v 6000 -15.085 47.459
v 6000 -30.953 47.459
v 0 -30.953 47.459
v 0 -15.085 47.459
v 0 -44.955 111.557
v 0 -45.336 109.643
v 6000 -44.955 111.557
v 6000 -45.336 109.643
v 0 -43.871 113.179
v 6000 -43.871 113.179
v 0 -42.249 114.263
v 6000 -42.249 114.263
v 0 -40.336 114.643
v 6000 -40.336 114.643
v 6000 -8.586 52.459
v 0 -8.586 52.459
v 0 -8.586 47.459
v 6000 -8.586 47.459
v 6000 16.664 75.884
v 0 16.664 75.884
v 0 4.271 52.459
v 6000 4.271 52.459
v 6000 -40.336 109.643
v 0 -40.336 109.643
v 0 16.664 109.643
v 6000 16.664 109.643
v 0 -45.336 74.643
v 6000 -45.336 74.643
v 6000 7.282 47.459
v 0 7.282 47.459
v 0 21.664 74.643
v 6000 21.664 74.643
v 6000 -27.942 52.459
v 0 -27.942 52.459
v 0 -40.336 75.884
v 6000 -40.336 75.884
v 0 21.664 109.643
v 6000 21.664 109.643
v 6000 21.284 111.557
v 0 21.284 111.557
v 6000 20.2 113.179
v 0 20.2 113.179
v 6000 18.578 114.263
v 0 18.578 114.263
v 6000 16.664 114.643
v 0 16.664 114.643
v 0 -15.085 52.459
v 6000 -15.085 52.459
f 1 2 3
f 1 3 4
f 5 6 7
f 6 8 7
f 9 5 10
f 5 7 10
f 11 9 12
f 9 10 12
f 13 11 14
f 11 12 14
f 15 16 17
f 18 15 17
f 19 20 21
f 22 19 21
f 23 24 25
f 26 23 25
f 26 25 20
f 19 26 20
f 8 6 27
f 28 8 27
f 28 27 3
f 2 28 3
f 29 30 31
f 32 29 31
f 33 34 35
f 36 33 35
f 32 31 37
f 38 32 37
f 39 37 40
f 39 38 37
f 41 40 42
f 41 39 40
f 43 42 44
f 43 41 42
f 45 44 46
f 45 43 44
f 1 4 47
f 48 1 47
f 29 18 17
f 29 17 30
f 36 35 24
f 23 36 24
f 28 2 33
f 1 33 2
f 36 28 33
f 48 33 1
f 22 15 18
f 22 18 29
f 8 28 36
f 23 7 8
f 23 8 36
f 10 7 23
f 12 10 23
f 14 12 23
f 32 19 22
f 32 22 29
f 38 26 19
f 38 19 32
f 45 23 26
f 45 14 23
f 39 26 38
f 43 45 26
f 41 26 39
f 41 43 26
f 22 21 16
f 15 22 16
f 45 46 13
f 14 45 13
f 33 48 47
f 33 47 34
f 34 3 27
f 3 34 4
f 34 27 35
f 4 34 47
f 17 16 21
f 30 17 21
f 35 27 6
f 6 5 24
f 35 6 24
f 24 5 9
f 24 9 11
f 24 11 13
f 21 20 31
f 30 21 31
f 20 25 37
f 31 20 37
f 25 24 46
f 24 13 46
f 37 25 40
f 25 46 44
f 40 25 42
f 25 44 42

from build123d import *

# Parameters (mm, degrees)
F1_DEPTH = 6000
F2_R     = 5


with BuildPart() as f1:
    # F0 (on Right) → F1 (new body)
    with BuildSketch(Plane.YZ):
        Polygon((-45.335583, 114.643262), (-45.335583, 74.643262), (-30.953255, 47.458794), (-15.084686, 47.458794), (-15.084686, 52.458794), (-27.941923, 52.458794), (-40.335583, 75.884421), (-40.335583, 109.643262), (16.664417, 109.643262), (16.664417, 75.884421), (4.270756, 52.458794), (-8.586481, 52.458794), (-8.586481, 47.458794), (7.282088, 47.458794), (21.664417, 74.643262), (21.664417, 114.643262), align=None)
    extrude(amount=F1_DEPTH)

    # F2
    f2_edges = [f1.edges().sort_by_distance(p)[0] for p in [
        (3000, 21.664417, 114.643262),
        (3000, -45.335583, 114.643262),
    ]]
    fillet(f2_edges, radius=F2_R)


solid = f1.part
